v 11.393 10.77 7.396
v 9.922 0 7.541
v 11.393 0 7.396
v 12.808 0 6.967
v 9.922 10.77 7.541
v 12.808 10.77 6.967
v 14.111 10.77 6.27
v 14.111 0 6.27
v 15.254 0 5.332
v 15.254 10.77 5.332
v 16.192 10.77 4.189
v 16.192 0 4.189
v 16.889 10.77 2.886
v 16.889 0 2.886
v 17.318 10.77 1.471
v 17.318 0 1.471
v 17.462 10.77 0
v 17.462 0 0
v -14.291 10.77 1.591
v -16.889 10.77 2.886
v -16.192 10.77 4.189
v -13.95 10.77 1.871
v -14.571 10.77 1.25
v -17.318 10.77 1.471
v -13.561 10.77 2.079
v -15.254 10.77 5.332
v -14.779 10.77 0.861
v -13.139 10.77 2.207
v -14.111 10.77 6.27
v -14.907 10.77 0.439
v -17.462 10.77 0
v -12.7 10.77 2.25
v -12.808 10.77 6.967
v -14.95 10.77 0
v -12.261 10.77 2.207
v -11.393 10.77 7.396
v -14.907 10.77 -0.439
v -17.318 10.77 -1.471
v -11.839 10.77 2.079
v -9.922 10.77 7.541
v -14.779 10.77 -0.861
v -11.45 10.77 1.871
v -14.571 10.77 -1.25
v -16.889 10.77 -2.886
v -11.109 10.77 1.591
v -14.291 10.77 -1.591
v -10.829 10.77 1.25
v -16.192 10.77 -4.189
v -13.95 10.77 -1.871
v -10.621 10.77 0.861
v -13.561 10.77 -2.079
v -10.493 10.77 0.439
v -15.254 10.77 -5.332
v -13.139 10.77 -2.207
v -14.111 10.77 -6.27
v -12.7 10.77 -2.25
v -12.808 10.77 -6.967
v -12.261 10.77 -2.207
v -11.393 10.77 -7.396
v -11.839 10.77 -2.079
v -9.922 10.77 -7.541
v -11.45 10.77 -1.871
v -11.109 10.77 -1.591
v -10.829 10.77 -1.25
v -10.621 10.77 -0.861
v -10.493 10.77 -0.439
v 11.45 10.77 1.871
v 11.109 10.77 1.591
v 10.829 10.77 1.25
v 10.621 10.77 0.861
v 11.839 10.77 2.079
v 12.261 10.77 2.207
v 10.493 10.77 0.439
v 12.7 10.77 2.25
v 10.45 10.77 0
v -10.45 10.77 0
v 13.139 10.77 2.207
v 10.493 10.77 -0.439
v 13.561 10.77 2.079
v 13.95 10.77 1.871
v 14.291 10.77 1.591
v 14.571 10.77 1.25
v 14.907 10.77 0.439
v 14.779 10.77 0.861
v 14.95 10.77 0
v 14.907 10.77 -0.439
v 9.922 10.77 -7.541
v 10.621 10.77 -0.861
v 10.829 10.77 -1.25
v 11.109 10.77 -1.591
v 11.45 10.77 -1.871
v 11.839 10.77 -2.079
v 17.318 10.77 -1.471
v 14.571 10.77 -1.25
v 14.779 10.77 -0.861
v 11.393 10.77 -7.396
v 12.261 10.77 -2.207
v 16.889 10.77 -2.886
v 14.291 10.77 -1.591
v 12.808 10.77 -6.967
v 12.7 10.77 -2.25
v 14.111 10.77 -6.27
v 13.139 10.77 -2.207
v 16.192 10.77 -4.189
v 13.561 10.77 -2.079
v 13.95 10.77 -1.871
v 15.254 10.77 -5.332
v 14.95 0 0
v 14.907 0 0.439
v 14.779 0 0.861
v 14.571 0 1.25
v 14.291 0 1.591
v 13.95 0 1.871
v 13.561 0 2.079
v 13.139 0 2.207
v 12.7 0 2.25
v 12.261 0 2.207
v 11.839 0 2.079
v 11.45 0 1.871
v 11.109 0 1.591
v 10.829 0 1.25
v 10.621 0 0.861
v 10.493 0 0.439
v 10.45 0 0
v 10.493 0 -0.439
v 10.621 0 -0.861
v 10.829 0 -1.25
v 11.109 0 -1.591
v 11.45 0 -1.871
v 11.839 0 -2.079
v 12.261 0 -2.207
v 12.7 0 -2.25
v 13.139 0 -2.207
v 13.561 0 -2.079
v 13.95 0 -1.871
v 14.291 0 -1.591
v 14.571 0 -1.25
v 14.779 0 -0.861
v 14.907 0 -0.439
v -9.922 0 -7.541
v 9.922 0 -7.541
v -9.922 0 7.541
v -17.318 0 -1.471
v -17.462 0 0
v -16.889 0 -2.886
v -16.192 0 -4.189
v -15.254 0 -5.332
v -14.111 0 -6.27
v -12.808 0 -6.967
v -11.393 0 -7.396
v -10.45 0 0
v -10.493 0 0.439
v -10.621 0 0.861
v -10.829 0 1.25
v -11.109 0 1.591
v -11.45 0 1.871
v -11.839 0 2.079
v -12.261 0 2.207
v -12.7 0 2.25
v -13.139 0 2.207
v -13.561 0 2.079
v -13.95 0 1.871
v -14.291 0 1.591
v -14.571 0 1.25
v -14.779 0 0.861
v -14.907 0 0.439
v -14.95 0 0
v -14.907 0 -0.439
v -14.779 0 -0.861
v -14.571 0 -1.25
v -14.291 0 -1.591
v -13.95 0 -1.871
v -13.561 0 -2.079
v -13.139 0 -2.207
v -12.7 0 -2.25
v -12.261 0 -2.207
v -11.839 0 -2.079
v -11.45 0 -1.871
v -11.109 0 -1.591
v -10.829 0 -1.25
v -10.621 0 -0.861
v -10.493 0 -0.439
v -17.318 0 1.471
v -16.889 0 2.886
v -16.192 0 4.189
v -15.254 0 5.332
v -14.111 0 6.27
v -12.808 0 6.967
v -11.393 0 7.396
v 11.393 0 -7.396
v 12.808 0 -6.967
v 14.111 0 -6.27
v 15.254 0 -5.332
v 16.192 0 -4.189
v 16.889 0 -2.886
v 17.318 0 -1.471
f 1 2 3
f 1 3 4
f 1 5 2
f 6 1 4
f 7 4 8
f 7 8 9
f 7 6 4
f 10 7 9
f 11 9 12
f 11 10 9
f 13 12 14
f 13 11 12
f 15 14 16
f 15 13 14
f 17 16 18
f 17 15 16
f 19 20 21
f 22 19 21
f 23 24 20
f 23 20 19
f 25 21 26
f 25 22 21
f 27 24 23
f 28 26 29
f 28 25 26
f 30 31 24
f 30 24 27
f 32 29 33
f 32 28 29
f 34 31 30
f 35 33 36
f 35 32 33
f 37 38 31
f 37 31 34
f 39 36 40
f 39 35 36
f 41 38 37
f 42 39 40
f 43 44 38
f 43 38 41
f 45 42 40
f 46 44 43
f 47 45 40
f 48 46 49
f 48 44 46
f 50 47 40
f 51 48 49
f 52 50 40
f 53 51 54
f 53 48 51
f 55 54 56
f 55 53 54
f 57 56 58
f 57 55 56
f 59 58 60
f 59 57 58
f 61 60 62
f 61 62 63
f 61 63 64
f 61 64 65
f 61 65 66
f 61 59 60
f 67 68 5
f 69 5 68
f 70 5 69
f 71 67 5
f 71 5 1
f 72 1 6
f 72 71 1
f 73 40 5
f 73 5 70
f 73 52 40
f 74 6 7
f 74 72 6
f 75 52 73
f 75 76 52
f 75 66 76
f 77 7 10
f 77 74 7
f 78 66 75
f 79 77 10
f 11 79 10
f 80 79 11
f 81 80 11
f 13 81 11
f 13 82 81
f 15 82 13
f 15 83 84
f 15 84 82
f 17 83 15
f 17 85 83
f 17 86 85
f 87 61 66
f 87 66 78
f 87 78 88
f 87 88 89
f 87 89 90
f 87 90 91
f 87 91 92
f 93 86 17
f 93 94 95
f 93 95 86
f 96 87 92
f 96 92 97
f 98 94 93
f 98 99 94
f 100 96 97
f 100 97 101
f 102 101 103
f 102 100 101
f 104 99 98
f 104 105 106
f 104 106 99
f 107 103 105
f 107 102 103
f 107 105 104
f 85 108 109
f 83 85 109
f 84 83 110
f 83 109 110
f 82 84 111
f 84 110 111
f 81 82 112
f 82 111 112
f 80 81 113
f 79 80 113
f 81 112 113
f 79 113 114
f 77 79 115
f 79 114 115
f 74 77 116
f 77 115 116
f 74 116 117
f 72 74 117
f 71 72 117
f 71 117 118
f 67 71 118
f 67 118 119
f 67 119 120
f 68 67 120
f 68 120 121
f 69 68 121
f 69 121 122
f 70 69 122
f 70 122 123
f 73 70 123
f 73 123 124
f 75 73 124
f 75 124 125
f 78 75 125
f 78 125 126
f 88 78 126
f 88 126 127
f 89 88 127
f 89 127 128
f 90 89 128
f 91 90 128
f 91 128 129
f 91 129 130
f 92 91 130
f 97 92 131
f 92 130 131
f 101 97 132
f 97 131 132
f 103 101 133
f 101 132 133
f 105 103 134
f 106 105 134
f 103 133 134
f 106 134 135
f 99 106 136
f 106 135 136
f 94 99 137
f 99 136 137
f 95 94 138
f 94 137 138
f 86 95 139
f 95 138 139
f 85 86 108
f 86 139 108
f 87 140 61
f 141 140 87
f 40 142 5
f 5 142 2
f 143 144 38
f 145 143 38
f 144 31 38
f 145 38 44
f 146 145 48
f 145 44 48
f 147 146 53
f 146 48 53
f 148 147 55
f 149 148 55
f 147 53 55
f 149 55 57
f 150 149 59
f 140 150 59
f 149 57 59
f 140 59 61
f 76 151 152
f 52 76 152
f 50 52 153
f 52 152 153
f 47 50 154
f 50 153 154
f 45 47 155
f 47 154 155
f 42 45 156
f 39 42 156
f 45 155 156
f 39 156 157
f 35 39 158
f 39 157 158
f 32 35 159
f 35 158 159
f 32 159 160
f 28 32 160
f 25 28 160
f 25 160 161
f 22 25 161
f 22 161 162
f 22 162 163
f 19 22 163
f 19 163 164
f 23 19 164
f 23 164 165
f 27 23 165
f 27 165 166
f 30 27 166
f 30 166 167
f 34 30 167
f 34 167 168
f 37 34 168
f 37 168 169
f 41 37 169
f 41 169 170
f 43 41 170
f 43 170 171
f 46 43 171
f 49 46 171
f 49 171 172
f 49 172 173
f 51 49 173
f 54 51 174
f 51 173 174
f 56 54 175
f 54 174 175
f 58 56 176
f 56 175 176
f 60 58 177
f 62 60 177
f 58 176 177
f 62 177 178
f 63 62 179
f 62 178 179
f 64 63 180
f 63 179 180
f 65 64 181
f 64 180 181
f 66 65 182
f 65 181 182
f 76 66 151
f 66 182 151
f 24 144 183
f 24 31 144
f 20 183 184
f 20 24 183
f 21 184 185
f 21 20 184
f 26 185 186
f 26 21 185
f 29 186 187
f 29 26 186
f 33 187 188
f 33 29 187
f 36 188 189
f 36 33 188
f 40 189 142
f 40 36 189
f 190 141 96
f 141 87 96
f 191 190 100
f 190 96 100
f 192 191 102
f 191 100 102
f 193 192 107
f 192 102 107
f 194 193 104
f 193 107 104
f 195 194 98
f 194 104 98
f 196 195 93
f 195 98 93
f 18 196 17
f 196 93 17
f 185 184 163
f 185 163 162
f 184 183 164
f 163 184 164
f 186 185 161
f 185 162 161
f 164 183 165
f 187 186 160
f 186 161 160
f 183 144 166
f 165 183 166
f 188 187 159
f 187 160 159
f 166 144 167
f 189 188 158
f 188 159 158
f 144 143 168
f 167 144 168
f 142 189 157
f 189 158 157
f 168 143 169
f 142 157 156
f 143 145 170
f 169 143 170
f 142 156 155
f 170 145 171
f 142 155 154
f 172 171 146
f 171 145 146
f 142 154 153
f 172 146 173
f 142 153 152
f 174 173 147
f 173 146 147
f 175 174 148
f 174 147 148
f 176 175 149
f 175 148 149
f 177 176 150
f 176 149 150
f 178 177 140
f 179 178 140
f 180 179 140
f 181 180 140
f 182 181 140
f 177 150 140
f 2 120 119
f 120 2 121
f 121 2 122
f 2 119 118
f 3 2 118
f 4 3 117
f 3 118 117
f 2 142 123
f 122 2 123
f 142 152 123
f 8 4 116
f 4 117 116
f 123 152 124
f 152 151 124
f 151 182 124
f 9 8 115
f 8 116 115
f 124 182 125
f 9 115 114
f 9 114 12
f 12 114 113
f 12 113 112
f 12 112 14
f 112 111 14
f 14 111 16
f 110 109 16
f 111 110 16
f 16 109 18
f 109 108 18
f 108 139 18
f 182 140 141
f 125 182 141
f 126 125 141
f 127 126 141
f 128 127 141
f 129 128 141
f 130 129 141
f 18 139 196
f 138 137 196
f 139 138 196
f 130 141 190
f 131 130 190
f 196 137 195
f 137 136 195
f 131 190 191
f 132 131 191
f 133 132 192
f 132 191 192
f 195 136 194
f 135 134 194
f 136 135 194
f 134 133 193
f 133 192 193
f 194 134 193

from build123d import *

# Parameters (mm, degrees)
SKETCH1_W            = 34.925
SKETCH1_H            = 15.08125
EXTRUDE1_DEPTH       = 10.7696
M4_CLEARANCE_HOLE1_D = 4.5
FILLET1_R            = 7.540625


with BuildPart() as part:
    # Sketch1 → Extrude1 (new body)
    with BuildSketch(Plane(origin=(0, 0, 0), x_dir=(1, 0, 0), z_dir=(0, 1, 0))):
        Rectangle(SKETCH1_W, SKETCH1_H)
    extrude(amount=EXTRUDE1_DEPTH)

    # M4 Clearance Hole1 (through all)
    with Locations(Plane(origin=(0, 10.7696, 0), x_dir=(-1, 0, 0), z_dir=(0, 1, 0))):
        with Locations((12.7, 0), (-12.7, 0)):
            Hole(M4_CLEARANCE_HOLE1_D / 2)

    # Fillet1
    fillet1_edges = [part.edges().sort_by_distance(p)[0] for p in [
        (17.4625, 5.3848, 7.540625),
        (17.4625, 5.3848, -7.540625),
        (-17.4625, 5.3848, -7.540625),
        (-17.4625, 5.3848, 7.540625),
    ]]
    fillet(fillet1_edges, radius=FILLET1_R - 0.0001)  # a hair under: the kernel refuses the full size


solid = part.part
